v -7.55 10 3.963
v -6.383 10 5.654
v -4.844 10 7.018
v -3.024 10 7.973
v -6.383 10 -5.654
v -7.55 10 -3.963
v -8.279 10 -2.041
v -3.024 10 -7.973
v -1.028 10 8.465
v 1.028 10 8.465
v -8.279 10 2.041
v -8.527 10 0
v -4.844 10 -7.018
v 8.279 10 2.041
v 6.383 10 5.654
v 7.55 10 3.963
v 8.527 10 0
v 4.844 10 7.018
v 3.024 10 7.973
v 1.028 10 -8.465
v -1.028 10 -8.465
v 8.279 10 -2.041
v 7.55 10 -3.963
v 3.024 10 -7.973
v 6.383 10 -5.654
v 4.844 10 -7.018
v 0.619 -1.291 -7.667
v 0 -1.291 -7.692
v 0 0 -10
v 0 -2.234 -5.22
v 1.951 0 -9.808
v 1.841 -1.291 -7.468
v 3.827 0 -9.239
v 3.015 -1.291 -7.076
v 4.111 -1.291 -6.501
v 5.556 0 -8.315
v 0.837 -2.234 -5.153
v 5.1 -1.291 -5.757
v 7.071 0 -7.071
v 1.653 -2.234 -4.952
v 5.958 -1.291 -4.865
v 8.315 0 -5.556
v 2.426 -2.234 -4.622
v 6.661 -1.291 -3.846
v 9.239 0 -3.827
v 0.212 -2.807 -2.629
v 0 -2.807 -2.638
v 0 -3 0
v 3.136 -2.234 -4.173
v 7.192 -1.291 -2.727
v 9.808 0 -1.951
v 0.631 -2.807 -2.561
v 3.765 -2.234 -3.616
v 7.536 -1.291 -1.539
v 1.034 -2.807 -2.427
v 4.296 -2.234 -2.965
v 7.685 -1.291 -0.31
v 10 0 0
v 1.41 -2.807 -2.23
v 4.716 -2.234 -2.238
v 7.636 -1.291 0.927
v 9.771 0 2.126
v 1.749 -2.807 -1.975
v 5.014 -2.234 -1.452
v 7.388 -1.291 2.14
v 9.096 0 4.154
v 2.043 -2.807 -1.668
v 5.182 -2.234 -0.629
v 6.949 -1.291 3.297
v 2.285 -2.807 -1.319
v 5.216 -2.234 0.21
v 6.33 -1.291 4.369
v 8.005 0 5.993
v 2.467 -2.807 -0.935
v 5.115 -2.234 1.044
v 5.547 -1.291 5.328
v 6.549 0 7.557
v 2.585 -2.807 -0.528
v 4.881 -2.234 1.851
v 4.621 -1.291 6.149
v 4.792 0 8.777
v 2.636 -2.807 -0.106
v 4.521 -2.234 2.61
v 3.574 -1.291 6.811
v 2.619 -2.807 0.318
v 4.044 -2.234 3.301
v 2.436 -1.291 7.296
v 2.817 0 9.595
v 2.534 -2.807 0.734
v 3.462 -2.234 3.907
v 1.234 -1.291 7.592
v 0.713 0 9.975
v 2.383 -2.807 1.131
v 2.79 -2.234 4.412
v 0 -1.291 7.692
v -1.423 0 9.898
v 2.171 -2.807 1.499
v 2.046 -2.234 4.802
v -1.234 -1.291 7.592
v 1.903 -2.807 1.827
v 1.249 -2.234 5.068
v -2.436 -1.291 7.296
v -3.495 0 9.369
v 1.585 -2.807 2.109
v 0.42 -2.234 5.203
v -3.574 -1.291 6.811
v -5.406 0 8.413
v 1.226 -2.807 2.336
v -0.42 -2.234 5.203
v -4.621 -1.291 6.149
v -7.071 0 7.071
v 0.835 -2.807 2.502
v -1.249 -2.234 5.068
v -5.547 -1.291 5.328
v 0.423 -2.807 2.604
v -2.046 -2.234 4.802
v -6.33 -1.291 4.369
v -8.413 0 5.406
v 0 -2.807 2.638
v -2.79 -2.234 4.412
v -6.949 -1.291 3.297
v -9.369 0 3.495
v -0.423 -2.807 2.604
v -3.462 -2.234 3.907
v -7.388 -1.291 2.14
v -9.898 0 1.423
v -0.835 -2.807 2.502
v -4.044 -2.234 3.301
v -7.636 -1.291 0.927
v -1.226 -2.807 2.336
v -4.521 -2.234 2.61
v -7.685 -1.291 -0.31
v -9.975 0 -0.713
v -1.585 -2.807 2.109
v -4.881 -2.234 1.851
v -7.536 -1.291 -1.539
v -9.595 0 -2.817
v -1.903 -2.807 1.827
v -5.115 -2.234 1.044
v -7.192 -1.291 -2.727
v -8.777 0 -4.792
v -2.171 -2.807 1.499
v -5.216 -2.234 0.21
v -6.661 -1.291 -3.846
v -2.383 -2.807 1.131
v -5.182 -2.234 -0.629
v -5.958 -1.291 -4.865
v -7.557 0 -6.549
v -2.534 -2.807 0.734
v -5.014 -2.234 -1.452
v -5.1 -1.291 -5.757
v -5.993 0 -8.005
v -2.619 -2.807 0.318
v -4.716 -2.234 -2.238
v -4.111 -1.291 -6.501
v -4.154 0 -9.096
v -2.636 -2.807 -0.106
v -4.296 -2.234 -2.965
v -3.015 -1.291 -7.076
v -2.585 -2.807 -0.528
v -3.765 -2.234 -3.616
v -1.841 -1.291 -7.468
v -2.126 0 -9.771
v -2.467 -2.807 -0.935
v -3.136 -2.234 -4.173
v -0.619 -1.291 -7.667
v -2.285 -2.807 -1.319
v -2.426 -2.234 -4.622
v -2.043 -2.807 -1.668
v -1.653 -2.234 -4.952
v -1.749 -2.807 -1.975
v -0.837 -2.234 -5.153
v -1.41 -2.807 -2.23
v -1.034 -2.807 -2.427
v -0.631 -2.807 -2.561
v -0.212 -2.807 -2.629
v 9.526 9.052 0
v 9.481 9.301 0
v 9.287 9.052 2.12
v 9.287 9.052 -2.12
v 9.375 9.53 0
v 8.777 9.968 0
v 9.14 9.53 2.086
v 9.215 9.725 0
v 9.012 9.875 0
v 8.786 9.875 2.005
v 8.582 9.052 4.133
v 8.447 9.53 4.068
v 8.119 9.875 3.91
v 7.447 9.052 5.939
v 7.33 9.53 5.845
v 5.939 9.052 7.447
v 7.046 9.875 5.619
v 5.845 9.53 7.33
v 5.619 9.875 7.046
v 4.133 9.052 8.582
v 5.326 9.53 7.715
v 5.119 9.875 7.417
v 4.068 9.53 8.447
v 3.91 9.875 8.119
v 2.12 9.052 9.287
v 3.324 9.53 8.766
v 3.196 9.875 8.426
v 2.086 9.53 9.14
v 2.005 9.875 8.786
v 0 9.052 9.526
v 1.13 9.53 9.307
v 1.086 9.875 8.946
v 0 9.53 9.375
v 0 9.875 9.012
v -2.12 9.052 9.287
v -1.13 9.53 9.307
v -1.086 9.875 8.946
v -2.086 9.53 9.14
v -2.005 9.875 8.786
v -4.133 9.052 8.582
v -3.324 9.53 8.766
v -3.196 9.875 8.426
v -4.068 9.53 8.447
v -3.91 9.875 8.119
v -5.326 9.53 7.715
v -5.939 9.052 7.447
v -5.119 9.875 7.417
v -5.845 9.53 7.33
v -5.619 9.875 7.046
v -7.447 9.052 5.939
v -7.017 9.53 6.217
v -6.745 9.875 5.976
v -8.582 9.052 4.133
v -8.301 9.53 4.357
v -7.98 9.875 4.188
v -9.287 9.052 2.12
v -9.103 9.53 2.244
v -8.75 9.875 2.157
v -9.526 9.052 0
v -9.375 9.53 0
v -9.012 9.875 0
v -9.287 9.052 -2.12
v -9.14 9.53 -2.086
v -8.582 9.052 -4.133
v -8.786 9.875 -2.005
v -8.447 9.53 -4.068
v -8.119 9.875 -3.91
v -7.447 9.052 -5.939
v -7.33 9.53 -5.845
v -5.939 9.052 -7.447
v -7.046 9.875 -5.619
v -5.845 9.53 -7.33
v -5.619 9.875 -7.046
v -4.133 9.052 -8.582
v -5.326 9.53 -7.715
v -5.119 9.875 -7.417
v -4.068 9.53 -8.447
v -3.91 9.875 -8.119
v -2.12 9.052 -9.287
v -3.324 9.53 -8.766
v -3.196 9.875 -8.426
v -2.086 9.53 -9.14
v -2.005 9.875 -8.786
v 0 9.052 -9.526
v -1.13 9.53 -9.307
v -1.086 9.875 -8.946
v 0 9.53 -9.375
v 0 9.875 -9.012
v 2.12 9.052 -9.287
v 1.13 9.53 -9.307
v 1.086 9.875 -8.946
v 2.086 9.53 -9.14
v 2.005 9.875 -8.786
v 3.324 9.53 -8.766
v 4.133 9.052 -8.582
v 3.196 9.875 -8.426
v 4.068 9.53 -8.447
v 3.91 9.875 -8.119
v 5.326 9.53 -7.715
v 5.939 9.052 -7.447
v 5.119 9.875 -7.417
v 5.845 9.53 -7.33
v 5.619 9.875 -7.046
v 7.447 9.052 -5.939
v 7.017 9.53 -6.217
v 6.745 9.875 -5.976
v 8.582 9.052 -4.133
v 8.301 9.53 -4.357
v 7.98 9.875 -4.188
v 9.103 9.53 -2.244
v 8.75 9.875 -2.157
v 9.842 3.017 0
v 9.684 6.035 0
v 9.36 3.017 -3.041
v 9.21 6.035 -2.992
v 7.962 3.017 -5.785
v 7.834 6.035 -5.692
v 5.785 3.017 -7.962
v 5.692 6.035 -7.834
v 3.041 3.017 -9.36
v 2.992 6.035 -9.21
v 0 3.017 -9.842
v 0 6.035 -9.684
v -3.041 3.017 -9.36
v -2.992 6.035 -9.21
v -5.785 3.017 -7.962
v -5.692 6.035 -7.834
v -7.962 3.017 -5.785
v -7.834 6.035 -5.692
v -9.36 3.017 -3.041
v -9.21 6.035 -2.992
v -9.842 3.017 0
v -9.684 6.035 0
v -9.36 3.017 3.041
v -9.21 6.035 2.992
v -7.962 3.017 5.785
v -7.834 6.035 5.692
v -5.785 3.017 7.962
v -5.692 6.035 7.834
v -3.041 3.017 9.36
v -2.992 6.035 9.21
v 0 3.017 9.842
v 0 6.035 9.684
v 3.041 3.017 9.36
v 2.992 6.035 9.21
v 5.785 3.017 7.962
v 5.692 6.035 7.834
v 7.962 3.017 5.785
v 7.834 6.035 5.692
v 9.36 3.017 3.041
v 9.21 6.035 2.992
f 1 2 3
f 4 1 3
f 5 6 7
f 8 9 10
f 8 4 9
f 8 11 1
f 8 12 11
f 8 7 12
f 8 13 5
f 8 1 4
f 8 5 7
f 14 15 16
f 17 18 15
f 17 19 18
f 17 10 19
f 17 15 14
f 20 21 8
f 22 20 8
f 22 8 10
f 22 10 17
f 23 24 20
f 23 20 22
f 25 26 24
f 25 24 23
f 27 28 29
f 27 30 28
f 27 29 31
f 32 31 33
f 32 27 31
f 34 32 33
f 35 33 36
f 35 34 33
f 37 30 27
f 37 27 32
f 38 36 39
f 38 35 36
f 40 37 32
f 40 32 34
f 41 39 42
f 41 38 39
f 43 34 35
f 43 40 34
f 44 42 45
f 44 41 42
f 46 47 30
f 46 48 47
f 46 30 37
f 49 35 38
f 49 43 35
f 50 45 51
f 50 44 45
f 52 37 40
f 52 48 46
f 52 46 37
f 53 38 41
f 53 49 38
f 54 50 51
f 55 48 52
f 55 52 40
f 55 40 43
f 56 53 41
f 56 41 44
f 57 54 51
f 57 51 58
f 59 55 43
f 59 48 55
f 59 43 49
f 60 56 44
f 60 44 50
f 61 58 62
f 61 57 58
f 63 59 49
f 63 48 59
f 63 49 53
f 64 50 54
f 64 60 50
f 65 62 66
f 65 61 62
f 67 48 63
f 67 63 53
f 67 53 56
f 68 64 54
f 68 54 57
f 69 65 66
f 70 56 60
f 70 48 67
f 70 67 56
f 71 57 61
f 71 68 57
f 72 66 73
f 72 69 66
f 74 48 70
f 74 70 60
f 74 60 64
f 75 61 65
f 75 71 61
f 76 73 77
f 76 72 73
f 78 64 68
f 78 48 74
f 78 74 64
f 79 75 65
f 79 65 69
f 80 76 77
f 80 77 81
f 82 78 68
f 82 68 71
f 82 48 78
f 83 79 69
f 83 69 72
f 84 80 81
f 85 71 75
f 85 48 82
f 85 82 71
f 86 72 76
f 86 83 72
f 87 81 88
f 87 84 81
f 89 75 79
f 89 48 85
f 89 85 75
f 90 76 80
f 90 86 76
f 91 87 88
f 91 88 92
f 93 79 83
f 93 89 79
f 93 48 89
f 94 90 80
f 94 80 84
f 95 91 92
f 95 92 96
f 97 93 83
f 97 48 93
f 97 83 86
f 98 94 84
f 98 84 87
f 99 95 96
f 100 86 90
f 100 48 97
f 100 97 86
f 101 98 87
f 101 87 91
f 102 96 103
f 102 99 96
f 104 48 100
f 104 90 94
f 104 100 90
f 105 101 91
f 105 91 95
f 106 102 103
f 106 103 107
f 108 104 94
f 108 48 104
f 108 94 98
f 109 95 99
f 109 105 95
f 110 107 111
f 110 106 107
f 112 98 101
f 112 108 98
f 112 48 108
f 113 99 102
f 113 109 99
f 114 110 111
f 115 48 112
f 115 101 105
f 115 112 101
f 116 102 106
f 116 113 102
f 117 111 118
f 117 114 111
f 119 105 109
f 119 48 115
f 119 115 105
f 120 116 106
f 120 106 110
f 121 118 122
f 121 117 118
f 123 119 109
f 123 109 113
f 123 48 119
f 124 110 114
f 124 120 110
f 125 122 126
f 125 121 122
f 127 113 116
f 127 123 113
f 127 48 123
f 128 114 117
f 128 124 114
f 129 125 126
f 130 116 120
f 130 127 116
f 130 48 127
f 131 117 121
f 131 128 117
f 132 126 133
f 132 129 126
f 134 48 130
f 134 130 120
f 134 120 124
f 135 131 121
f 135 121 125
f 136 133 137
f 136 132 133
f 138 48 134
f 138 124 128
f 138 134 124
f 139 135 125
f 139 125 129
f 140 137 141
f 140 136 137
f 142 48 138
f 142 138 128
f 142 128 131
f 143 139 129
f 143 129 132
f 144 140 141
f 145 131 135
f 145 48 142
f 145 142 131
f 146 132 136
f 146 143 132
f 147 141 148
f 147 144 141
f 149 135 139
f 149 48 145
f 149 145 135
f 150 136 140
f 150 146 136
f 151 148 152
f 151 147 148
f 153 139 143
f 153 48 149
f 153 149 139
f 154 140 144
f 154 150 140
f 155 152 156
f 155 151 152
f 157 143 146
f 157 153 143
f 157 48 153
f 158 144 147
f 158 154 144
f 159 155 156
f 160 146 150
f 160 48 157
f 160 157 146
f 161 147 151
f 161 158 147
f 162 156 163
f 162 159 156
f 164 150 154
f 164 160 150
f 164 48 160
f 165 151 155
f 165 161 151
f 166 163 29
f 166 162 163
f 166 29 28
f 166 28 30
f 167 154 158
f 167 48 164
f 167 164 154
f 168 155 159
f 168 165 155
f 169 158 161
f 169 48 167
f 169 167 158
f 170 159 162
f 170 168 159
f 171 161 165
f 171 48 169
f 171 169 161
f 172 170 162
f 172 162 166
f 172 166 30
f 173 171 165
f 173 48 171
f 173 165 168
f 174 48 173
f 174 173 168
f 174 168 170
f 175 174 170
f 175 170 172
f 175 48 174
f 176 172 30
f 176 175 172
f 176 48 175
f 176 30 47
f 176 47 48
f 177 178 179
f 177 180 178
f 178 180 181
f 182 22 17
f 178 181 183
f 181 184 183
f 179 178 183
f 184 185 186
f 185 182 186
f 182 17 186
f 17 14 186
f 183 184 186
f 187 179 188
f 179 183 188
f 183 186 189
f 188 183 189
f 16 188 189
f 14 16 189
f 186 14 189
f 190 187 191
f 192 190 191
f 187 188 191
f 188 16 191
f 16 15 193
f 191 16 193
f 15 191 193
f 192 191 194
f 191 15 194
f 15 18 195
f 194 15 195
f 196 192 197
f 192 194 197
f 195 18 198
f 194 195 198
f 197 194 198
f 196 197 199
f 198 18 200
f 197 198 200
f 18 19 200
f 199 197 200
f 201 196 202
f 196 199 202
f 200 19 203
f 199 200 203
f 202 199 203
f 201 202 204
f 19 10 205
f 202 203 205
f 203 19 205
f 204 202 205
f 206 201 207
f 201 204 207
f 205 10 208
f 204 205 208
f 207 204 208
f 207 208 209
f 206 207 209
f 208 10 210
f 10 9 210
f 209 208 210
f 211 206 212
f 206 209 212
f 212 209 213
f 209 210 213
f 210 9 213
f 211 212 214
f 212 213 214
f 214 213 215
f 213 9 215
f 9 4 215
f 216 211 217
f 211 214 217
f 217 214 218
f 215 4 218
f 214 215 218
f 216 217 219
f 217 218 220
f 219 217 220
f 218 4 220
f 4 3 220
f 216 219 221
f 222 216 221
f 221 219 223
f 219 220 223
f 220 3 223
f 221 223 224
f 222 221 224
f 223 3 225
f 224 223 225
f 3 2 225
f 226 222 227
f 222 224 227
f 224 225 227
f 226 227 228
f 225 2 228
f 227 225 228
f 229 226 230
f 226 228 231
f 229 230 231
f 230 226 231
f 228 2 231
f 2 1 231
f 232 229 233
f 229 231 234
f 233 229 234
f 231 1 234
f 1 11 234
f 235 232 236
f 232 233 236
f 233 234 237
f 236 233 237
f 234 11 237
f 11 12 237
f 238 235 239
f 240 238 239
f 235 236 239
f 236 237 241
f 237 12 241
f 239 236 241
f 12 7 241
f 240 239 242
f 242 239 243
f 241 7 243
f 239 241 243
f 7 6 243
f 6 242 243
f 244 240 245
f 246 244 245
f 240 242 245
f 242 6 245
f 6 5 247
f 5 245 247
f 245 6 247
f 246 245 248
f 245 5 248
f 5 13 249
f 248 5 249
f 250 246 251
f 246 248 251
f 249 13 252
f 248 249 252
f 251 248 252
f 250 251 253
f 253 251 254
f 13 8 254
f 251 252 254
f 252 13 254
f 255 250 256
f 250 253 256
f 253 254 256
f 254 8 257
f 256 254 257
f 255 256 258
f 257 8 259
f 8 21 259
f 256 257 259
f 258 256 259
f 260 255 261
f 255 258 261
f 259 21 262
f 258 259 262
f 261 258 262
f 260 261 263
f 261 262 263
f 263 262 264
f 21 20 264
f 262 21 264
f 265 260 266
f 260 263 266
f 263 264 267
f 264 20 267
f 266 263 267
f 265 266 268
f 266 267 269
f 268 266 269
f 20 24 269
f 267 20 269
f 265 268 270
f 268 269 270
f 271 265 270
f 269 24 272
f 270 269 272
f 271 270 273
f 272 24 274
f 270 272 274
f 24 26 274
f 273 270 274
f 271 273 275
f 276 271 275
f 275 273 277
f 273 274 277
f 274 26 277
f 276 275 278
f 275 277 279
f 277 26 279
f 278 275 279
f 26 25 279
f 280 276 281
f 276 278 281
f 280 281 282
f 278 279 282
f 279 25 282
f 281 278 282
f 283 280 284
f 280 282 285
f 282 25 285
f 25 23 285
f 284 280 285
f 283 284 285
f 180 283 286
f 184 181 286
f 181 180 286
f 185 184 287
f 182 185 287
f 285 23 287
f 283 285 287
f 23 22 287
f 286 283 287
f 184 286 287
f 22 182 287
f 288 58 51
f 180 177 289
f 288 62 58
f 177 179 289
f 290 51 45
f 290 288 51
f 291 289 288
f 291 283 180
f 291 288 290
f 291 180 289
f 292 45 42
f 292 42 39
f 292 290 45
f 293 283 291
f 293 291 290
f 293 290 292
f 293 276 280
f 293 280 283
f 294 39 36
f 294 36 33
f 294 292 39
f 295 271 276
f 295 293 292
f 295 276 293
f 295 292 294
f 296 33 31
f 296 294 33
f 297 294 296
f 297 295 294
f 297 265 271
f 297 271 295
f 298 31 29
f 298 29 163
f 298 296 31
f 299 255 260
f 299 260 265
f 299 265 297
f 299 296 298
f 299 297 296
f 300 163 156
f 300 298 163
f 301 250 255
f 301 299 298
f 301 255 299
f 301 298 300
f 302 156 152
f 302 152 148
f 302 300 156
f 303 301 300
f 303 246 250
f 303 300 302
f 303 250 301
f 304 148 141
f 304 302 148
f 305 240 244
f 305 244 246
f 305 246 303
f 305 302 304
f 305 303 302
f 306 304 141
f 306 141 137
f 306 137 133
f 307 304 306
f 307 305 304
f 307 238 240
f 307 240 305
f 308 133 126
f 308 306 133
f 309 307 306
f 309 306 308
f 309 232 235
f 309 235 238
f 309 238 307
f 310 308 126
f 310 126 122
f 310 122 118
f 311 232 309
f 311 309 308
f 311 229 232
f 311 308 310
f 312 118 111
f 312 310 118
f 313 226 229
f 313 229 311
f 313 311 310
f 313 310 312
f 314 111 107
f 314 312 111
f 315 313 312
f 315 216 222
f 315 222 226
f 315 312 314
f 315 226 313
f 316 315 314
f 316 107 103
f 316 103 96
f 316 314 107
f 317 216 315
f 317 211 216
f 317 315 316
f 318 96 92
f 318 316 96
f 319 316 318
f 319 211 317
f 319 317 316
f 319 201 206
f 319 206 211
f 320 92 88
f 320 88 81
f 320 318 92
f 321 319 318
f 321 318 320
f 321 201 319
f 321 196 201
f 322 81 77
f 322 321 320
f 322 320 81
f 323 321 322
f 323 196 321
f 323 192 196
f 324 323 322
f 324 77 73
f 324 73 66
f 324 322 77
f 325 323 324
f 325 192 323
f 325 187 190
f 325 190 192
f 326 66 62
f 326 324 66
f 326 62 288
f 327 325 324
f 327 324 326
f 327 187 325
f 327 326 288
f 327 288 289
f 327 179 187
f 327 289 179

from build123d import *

# Parameters (mm, degrees)
SKETCH1_R           = 10
BOSS_EXTRUDE1_DEPTH = 10
BOSS_EXTRUDE1_TAPER = 3
DOME1_FACE_RADIUS   = 10
DOME1_HEIGHT        = 3
FILLET1_R           = 1


with BuildPart() as part:
    # Sketch1 → Boss-Extrude1 (new body)
    with BuildSketch(Plane(origin=(0, 0, 0), x_dir=(1, 0, 0), z_dir=(0, 1, 0))):
        Circle(SKETCH1_R)
    extrude(amount=BOSS_EXTRUDE1_DEPTH, taper=BOSS_EXTRUDE1_TAPER)

    # Dome1: a dome of height H over a round flat face of radius A is a cap of a sphere of radius (A * A + H * H) / (2 * H)
    dome1_r = (DOME1_FACE_RADIUS * DOME1_FACE_RADIUS + DOME1_HEIGHT * DOME1_HEIGHT) / (2 * DOME1_HEIGHT)
    dome1_base = Plane((0, 0, 0), z_dir=(0, -1, 0))
    with Locations(dome1_base.offset(DOME1_HEIGHT - dome1_r)):
        dome1_ball = Sphere(dome1_r, mode=Mode.PRIVATE)
    add(split(dome1_ball, bisect_by=dome1_base, keep=Keep.TOP, mode=Mode.PRIVATE))

    # Fillet1
    fillet1_edges = [part.edges().sort_by_distance(p)[0] for p in [
        (-9.475922207, 10, 0),
    ]]
    fillet(fillet1_edges, radius=FILLET1_R)


solid = part.part
